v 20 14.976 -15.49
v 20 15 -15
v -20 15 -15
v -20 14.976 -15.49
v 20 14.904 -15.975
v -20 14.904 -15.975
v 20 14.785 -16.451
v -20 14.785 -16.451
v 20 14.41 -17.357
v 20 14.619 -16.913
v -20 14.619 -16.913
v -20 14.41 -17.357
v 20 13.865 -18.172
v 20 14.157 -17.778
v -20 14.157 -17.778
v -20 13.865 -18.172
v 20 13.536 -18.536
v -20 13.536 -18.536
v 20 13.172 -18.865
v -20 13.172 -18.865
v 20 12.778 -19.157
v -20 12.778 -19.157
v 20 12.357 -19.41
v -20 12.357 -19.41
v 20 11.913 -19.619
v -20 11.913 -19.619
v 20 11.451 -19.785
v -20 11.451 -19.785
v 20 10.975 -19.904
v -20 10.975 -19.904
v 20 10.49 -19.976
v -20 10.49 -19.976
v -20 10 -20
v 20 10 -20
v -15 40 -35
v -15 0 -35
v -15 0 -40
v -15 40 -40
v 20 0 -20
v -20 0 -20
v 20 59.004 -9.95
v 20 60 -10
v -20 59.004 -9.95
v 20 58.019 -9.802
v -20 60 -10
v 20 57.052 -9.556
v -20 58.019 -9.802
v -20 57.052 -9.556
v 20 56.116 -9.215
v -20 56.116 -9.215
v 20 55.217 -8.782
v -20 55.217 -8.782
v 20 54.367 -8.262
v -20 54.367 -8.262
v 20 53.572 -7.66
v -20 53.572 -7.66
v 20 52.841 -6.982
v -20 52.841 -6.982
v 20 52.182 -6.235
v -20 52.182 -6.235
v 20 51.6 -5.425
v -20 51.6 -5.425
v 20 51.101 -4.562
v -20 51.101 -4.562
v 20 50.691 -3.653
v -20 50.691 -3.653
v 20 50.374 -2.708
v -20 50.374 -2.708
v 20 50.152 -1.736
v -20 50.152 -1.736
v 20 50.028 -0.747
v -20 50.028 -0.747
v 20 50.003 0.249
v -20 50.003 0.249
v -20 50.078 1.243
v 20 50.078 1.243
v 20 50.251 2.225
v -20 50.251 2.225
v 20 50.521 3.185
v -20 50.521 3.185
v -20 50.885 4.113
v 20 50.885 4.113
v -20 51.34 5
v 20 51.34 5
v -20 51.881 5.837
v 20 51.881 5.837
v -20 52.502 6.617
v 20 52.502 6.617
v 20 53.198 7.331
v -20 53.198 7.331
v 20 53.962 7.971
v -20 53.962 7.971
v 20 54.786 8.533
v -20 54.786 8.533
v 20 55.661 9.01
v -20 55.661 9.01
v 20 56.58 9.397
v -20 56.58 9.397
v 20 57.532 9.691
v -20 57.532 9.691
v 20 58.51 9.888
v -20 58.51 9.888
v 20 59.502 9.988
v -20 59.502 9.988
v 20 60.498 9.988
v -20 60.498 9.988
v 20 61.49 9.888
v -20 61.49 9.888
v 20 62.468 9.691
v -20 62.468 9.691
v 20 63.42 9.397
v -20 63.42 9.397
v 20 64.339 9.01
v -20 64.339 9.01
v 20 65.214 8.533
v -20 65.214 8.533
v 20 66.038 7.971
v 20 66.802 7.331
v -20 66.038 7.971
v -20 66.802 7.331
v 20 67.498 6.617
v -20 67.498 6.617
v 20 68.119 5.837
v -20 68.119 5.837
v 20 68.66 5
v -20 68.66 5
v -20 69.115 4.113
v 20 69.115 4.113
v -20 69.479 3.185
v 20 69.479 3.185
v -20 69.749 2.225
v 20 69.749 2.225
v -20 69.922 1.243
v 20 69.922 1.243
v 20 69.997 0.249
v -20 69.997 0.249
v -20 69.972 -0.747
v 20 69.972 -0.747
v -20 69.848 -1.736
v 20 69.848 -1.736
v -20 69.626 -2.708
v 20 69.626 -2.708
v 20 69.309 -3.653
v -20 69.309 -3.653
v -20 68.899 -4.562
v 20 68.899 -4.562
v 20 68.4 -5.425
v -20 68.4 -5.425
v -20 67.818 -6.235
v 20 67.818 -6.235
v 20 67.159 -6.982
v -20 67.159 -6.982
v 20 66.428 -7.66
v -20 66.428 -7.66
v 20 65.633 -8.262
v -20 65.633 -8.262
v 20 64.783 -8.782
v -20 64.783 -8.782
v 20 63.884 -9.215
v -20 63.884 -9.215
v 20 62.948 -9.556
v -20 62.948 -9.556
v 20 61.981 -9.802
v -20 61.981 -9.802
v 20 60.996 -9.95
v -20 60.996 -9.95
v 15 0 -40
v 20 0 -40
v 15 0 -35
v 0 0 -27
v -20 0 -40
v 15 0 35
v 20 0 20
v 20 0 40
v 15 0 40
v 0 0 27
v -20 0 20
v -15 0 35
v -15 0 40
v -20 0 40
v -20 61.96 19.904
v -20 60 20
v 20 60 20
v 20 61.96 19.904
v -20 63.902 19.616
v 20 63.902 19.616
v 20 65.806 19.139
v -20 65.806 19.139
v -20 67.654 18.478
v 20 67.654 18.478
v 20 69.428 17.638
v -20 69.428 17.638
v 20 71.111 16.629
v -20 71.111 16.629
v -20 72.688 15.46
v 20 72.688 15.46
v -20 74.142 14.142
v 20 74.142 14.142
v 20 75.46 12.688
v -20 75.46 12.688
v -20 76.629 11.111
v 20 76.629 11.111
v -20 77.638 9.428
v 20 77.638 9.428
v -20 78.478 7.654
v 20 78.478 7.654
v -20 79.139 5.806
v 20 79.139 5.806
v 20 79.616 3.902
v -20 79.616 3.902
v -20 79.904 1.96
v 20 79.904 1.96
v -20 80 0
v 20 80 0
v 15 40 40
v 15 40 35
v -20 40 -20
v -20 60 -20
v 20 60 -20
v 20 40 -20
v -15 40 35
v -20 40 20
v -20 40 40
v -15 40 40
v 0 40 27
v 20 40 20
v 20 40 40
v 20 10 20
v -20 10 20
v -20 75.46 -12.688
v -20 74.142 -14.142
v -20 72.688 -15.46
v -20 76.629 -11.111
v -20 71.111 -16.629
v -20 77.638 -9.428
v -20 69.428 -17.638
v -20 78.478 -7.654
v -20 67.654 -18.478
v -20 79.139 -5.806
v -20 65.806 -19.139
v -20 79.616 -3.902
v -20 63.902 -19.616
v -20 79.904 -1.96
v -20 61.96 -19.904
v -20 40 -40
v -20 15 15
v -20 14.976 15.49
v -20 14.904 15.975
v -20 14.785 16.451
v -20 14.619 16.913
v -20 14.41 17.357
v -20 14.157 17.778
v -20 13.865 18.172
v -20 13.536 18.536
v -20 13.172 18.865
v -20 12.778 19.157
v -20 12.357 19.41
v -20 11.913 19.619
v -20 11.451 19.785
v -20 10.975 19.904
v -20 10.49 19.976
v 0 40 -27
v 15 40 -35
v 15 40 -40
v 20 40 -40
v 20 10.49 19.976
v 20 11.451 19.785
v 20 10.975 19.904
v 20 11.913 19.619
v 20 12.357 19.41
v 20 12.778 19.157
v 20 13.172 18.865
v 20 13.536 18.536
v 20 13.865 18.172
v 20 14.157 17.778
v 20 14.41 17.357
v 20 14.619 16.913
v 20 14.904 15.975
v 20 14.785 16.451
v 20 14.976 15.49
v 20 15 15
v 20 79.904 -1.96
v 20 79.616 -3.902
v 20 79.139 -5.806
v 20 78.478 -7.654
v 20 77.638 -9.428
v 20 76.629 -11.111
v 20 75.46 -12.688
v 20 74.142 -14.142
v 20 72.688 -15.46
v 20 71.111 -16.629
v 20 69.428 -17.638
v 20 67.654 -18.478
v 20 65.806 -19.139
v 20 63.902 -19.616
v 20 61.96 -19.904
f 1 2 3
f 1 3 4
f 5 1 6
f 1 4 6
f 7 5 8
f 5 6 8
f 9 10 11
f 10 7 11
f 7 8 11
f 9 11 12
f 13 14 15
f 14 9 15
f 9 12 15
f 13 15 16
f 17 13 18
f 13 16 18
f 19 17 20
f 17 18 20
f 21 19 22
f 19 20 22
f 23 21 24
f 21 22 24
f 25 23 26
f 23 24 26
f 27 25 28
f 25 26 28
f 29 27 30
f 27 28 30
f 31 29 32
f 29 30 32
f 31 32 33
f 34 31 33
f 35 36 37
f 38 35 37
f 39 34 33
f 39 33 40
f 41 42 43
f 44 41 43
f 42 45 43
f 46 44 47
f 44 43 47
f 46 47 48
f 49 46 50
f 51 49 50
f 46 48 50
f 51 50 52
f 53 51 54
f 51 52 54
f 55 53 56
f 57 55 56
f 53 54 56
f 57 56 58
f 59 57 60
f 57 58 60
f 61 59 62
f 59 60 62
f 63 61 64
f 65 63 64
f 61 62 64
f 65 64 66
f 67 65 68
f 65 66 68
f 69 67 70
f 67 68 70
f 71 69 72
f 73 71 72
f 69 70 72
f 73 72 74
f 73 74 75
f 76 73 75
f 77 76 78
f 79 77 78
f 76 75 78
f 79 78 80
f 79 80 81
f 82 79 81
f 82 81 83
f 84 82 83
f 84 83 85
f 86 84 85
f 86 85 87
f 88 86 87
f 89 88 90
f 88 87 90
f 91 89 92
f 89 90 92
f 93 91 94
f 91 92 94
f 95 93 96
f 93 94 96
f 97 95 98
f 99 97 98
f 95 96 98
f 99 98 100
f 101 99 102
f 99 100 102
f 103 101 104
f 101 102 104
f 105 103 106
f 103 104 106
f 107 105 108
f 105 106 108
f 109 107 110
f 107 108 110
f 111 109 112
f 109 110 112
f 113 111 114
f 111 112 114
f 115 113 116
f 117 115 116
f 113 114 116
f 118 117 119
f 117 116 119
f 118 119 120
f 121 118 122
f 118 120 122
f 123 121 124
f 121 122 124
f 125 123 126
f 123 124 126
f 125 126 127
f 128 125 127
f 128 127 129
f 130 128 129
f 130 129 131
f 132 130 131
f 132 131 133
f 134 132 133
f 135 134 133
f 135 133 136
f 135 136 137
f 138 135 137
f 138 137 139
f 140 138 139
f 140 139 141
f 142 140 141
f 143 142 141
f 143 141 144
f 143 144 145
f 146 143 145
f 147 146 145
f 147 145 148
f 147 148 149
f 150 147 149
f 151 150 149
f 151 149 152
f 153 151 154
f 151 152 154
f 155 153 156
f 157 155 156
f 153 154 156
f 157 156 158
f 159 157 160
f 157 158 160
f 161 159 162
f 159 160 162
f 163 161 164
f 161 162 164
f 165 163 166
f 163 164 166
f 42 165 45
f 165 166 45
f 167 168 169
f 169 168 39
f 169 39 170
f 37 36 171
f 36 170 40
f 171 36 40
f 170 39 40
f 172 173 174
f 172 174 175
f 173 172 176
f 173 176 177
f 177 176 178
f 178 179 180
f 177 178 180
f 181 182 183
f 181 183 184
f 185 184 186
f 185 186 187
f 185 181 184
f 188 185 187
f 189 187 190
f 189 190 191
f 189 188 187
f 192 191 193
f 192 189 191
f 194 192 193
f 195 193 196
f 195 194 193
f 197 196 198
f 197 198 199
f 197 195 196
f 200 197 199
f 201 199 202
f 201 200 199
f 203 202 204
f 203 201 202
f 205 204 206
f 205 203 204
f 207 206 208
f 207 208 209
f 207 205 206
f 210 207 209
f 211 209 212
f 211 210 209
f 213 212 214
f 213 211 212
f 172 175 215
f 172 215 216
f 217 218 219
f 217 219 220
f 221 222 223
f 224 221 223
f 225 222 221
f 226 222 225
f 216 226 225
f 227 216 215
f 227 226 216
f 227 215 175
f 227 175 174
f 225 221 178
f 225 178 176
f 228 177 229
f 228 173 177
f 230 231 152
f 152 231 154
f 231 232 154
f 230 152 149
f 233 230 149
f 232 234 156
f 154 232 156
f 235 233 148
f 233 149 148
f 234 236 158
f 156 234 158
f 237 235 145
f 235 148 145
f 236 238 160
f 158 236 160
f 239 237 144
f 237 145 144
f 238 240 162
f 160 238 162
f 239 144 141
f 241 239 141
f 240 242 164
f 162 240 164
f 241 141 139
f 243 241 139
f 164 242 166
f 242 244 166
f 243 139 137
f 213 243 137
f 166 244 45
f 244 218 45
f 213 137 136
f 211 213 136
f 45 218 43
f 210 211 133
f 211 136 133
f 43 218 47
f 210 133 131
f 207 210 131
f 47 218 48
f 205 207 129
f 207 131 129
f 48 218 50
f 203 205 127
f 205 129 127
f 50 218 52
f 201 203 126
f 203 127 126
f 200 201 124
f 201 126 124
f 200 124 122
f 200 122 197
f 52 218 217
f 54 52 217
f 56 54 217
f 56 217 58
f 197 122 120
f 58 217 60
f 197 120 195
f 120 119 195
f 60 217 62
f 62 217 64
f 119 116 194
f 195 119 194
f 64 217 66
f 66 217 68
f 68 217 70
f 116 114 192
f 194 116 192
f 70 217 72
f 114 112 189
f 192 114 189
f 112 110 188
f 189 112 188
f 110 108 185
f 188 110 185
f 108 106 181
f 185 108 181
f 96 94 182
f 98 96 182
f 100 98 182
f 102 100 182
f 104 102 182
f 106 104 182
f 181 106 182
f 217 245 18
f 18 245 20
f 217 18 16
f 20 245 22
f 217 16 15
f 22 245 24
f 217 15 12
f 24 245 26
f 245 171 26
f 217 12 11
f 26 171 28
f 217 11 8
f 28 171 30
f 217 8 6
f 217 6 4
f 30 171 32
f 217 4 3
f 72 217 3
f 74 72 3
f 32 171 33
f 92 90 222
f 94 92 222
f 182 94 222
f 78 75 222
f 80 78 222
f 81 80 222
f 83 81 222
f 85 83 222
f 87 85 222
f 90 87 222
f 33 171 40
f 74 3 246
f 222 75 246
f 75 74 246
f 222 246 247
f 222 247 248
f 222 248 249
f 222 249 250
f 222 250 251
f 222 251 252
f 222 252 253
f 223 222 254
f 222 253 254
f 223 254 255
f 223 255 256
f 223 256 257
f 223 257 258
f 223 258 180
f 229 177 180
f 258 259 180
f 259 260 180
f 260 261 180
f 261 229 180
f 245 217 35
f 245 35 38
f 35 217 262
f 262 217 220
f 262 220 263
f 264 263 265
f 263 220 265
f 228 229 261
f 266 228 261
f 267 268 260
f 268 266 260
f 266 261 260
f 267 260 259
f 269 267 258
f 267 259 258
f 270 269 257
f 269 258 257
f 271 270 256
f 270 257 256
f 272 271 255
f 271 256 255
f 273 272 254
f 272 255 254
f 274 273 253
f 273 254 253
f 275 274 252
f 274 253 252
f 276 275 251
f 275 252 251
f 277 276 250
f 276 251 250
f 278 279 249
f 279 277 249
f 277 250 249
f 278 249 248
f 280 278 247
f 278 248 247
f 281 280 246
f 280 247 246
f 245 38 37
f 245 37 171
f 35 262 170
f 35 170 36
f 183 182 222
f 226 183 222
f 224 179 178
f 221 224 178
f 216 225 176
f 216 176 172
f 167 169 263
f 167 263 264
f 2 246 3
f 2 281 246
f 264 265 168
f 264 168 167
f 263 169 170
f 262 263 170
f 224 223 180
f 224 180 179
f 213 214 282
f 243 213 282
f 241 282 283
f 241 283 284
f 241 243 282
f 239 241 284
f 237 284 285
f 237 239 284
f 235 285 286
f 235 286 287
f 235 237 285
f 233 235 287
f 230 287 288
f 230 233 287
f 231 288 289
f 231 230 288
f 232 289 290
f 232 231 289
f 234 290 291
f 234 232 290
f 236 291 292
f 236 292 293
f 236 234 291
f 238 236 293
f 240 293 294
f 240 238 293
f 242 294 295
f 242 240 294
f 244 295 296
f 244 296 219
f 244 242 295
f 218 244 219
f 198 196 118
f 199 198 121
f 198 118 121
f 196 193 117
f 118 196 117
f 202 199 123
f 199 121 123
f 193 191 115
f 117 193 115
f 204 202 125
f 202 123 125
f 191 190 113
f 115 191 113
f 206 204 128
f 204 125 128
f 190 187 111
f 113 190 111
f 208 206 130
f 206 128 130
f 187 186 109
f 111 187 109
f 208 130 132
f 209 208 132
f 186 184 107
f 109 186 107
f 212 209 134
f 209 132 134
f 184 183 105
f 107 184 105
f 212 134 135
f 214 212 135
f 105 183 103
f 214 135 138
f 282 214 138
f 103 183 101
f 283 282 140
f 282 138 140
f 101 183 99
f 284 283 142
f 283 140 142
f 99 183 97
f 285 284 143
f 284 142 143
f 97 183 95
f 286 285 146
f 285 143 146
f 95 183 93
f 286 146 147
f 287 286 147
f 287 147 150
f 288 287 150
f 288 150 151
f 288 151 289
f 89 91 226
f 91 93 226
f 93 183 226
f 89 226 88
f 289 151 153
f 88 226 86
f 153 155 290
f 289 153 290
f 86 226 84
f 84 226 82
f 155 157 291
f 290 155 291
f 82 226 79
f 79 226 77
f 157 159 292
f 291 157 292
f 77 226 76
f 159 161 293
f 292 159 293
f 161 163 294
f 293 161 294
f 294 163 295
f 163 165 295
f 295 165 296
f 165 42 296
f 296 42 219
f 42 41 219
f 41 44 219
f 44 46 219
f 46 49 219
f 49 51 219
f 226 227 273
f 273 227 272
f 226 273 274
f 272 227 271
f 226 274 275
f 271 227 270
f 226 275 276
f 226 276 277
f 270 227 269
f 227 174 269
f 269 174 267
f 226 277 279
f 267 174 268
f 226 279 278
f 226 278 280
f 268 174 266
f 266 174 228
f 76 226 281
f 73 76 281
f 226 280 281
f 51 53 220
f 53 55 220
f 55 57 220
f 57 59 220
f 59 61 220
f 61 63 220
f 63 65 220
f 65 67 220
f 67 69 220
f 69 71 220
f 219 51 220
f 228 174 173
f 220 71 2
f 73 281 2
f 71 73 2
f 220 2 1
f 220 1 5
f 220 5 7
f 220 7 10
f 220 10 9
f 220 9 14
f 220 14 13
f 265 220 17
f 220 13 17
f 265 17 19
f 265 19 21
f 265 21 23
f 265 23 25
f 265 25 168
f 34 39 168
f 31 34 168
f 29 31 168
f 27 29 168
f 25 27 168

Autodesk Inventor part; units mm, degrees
ref_plane "YZ Plane" through (0, 0, 0) normal (1, 0, 0) x (0, 1, 0)
ref_plane "XZ Plane" through (0, 0, 0) normal (0, 1, 0) x (-1, 0, 0)
ref_plane "XY Plane" through (0, 0, 0) normal (0, 0, 1) x (1, 0, 0)
sketch "Esboço1" plane through (0, 0, 0) normal (0, 1, 0) x (-1, 0, 0)
  line L0 (20, 40) -> (-20, 40)
  line L1 (-20, 40) -> (-20, -40)
  line L2 (-20, -40) -> (20, -40)
  line L3 (20, -40) -> (20, 40)
  line L4 (20, 40) -> (-20, -40) construction
  line L5 (-20, 40) -> (20, -40) construction
  point P0 (0, 0)
  dimension "d0" = 40
  dimension "d1" = 80
extrude "Extrusão1" add sketch "Esboço1" along normal blind 80
sketch "Esboço2" plane through (20, 0, 40) normal (1, 0, 0) x (0, 0, -1)
  line L0 (0, 80) -> (80, 80) projected
  line L1 (0, 80) -> (20, 80)
  line L2 (20, 80) -> (20, 40)
  line L3 (20, 40) -> (0, 40)
  line L4 (0, 40) -> (0, 80)
  line L5 (80, 80) -> (60, 80)
  line L6 (60, 80) -> (60, 40)
  line L7 (60, 40) -> (80, 40)
  line L8 (80, 40) -> (80, 80)
  line L9 (0, 0) -> (80, 0) projected
  point P0 (40, 0)
  point P1 (60, 60)
  point P2 (20, 80)
  dimension "d4" = 40
  dimension "d5" = 20
  dimension "d6" = 20
extrude "Extrusão2" cut sketch "Esboço2" against normal blind 80
fillet "Arredondamento1" radius 20 2 edges at (0, 80, 20) (0, 80, -20)
sketch "Esboço3" plane through (20, 0, 40) normal (1, 0, 0) x (0, 0, -1)
  arc A0 (60, 60) -> (20, 60) centre (40, 60) ccw projected
  point P0 (40, 0)
hole "Furo1" at (20, 60, 0) direction (-1, 0, 0) diameter 20 end through all
sketch "Esboço4" plane through (20, 40, 40) normal (0, 1, 0) x (1, 0, 0)
  line L0 (0, 0) -> (0, 80) projected
  line L1 (0, 0) -> (-5, 0)
  line L2 (-40, 0) -> (0, 0) projected
  line L3 (-5, 0) -> (-5, 5)
  line L4 (-40, 0) -> (-35, 0)
  line L5 (-35, 0) -> (-35, 5)
  line L6 (-35, 0) -> (-20, 0) construction
  line L7 (-20, 0) -> (-20, 13) construction
  line L8 (-35, 5) -> (-20, 13)
  line L9 (-20, 13) -> (-5, 5)
  point P0 (-20, 40)
  dimension "d17" = 5
  dimension "d18" = 5
  dimension "d19" = 5
  dimension "d20" = 15
  dimension "d21" = 13
extrude "Extrusão3" cut sketch "Esboço4" against normal blind 80
mirror "Espelhar1" about plane through (0, 0, 0) normal (0, 0, 1) of "Extrusão3"
sketch "Esboço5" plane through (20, 0, 40) normal (1, 0, 0) x (0, 0, -1)
  point P0 (40, 0)
sketch "Esboço6" plane through (20, 0, 40) normal (1, 0, 0) x (0, 0, -1)
  line L0 (0, 0) -> (0, 40) construction
  line L1 (0, 0) -> (20, 0) construction
  line L2 (0, 0) -> (80, 0) construction
  line L3 (20, 0) -> (20, 15)
  line L4 (20, 15) -> (60, 15)
  line L5 (60, 15) -> (60, 0)
  line L6 (60, 0) -> (20, 0)
  point P0 (40, 0)
  dimension "d24" = 20
  dimension "d25" = 15
  dimension "d26" = 40
extrude "Extrusão4" cut sketch "Esboço6" against normal blind 80
fillet "Arredondamento2" radius 5 2 edges at (0, 15, -20) (0, 15, 20)
